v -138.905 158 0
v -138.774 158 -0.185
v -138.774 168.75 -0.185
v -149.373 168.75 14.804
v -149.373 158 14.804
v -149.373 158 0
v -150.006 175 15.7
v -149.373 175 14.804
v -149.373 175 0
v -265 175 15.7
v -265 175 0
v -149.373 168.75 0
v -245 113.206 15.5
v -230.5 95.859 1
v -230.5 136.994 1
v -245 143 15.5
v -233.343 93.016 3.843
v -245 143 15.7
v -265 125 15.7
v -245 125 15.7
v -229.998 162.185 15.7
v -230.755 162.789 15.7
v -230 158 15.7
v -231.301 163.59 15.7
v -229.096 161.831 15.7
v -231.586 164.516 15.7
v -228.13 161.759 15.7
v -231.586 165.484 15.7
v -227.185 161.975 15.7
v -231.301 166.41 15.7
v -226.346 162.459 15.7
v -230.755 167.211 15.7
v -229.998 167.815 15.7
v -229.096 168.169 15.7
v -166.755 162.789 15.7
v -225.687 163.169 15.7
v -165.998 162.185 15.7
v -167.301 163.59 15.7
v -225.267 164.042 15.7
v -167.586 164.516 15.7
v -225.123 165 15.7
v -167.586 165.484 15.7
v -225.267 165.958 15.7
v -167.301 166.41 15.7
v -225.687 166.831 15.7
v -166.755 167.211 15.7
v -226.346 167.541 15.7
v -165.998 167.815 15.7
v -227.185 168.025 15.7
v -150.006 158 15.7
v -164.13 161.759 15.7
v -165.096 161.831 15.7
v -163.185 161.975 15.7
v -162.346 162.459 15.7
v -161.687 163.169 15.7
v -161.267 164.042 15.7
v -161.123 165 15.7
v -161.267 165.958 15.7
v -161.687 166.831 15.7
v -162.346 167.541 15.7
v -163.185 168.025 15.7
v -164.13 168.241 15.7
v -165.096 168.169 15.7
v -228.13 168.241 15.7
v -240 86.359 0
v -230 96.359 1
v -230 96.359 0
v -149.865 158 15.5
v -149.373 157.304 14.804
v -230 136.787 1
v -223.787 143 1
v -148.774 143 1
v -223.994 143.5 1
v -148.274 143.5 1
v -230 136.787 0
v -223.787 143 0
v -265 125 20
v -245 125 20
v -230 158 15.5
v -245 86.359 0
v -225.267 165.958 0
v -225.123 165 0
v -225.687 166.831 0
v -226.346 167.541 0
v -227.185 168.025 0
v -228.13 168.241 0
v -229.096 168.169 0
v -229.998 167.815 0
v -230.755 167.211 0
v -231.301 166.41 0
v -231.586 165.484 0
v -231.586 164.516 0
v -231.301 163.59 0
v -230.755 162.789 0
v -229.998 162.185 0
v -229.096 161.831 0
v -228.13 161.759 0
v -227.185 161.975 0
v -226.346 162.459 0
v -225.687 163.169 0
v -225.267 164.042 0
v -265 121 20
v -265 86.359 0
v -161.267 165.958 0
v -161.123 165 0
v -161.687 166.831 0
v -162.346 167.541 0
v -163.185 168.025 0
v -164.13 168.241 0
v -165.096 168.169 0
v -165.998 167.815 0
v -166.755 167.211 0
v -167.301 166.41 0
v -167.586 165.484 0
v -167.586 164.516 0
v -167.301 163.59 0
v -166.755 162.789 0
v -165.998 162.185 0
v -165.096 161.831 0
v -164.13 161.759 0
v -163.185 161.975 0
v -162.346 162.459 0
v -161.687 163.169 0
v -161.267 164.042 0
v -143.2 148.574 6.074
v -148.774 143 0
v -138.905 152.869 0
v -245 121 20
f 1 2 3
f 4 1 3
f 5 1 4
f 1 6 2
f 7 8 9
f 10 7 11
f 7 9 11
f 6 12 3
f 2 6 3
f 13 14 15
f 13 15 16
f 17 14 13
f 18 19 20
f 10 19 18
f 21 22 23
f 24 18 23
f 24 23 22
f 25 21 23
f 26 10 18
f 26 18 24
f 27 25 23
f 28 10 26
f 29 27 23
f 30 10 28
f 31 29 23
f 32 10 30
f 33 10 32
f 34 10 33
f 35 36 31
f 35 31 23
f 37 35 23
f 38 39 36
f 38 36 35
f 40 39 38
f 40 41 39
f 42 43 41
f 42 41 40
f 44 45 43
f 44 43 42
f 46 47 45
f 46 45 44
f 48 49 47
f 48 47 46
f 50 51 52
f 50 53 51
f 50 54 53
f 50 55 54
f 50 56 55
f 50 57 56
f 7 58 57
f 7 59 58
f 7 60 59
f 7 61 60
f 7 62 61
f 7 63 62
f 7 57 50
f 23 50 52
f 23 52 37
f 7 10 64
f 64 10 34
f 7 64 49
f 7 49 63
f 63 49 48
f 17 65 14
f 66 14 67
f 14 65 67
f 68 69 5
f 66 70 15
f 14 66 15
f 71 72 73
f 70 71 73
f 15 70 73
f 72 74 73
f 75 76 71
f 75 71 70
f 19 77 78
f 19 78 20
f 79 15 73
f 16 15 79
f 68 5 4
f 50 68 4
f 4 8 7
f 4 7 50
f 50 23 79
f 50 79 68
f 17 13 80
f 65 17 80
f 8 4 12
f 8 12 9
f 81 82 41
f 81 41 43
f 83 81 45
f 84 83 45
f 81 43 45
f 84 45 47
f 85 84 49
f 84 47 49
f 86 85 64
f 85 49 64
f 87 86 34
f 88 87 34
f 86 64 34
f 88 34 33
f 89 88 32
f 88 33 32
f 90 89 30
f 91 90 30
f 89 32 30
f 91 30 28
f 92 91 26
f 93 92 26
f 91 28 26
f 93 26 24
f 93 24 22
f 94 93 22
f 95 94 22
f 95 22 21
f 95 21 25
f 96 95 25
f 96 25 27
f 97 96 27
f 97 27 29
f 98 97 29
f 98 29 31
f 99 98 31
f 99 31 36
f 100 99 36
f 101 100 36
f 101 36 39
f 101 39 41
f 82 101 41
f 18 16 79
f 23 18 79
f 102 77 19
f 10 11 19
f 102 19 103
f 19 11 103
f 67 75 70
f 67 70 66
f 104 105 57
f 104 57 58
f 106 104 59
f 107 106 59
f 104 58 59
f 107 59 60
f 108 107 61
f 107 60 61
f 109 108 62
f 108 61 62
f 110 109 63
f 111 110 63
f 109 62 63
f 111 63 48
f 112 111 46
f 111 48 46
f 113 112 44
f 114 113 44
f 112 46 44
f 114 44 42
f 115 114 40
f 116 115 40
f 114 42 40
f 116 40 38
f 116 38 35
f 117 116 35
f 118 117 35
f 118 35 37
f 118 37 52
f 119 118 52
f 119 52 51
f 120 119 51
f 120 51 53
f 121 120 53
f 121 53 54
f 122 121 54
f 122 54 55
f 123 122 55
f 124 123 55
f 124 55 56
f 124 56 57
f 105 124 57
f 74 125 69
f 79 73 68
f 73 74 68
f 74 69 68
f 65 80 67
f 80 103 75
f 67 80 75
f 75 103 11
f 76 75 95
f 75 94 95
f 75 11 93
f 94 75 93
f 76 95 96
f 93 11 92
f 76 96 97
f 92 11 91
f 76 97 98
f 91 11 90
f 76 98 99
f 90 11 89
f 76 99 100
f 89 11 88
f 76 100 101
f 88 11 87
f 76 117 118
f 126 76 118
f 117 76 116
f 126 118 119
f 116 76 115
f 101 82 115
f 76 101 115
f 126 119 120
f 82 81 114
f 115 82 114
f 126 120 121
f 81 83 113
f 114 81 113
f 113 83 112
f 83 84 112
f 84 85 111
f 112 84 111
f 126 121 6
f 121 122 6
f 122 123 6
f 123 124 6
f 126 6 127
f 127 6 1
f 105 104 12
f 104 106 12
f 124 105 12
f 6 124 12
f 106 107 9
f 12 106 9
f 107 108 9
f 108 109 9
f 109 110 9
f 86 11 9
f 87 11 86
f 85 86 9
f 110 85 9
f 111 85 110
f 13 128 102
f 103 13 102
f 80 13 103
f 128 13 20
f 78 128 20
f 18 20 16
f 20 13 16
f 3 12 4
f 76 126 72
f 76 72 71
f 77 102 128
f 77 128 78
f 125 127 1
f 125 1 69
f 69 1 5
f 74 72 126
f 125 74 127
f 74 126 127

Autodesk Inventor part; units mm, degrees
ref_plane "YZ Plane" through (0, 0, 0) normal (1, 0, 0) x (0, 1, 0)
ref_plane "XZ Plane" through (0, 0, 0) normal (0, 1, 0) x (-1, 0, 0)
ref_plane "РабПлоскость1" through (0, 0, 0) normal (0, 0, 1) x (1, 0, 0)
sketch "Эскиз1" plane through (0, 0, 0) normal (0, 0, 1) x (1, 0, 0)
  line L0 (265, 175) -> (-265, 175)
  line L1 (-265, 175) -> (-265, -175)
  line L2 (-265, 125) -> (-245, 125)
  line L3 (-245, 125) -> (-245, 143)
  line L4 (-245, 143) -> (-230, 158)
  line L5 (-230, 158) -> (-149.3726, 158)
  line L6 (-149.3726, 158) -> (-149.3726, 178)
  point P0 (0, 0)
  point P1 (-149.3726, 175)
extrude "Выдавливание1" add sketch "Эскиз1" along normal blind 15.7
sketch "Эскиз2" plane through (-245, 125, 0) normal (1, 0, 0) x (0, 0, -1)
  line L0 (0, 0) -> (-15.7, 0) projected
  line L1 (-20, -4) -> (0, -38.641) projected
  line L2 (-20, -4) -> (-20, 0) projected
  line L3 (0, 50) -> (0, -300) projected
  line L4 (-20, 0) -> (-15.7574, 0) projected
  line L5 (-20, 0) -> (0, 0)
  line L6 (0, -38.641) -> (0, 0)
  point P0 (0, -125)
  point P1 (-1, -36.909)
  point P2 (-1, 0)
  point P3 (-1, 0)
ref_plane "РабПлоскость2" through (-265, -125, -86) normal (1, 0, 0) x (0, 1, 0)
extrude "Выдавливание2" add sketch "Эскиз2" against normal up to surface (20 mm away)
sketch "Эскиз3" plane through (-230, 158, 0) normal (0, -1, 0) x (1, 0, 0)
  line L0 (91.2262, -0.185) -> (79.9532, 15.7574) projected
  line L1 (80.6274, 0) -> (80.6274, 15.7) projected
  line L2 (0, 0) -> (80.6274, 0) projected
  line L3 (80.6274, 0) -> (91.2262, -0.185)
  point P0 (230, 0)
  point P1 (80.6274, 14.8038)
extrude "Выдавливание3" add sketch "Эскиз3" against normal blind 10.75
sketch "Эскиз4" plane through (0, 0, 0) normal (0, 0, -1) x (-1, 0, 0)
  line L0 (245, 143) -> (230, 158) projected
  line L1 (230, 158) -> (149.3726, 158) projected
  line L2 (245, 86.359) -> (245, 143) projected
  line L3 (149.3726, 158) -> (138.7738, 158) projected
  line L4 (148.7738, 143) -> (149.3726, 143)
  line L5 (149.3726, 143) -> (223.7868, 143)
  line L6 (223.7868, 143) -> (230, 136.7868)
  line L7 (230, 136.7868) -> (230, 96.359)
  line L8 (138.7738, 153) -> (138.7738, 158)
  line L9 (240, 86.359) -> (245, 86.359)
  line L10 (240, 86.359) -> (230, 96.359)
  line L11 (148.7738, 143) -> (138.7738, 153)
  point P0 (0, 0)
  point P1 (138.7738, 143)
  point P2 (230, 86.359)
  point P3 (245, 88.091)
  dimension "d6" = 15
  dimension "d7" = 10
  dimension "d8" = 10
  dimension "d9" = 10
  dimension "d10" = 10
extrude "Выдавливание4" add sketch "Эскиз4" against normal blind 1
chamfer "Фаска1" distance 14.5 angle 45 3 edges at (-237.5, 150.5, 1) (-184.8059, 158, 1) (-245, 115.5455, 1)
sketch "Эскиз5" plane through (-245, 86.359, 15.5) normal (-1, 0, 0) x (0, 0, 1)
  point P0 (-15.5, -86.359)
sketch "Эскиз6" plane through (-245, 86.359, 15.5) normal (-1, 0, 0) x (0, 0, 1)
  line L0 (-15.5, 0) -> (0, 0) projected
  line L1 (0, 26.8468) -> (-15.5, 0) projected
  line L2 (0, 26.8468) -> (0, 0) projected
  point P0 (-15.5, -86.359)
extrude "Выдавливание5" cut sketch "Эскиз6" against normal blind 19.5
sketch "Эскиз7" plane through (-149.3726, 158, 15.5) normal (0, 1, 0) x (1, 0, 0)
  line L0 (10.5987, 15.5) -> (10.5987, 0) projected
  line L1 (10.4679, 15.5) -> (10.5987, 15.5) projected
  line L2 (10.4679, 15.5) -> (0, 0.6962) projected
  line L3 (0, 0.6962) -> (0, 0) projected
  line L4 (0, 0) -> (10.5987, 0) projected
  point P0 (149.3726, 15.5)
extrude "Выдавливание6" cut sketch "Эскиз7" against normal blind 19.5
sketch "Эскиз8" plane through (0, 0, 15.7) normal (0, 0, 1) x (1, 0, 0)
  circle A0 centre (-164.3726, 165) radius 3.25 projected
  circle A1 centre (-228.3726, 165) radius 3.25 projected
  point P0 (0, 0)
extrude "Выдавливание7" cut sketch "Эскиз8" against normal blind 28.75
sketch "Эскиз9" plane through (-230, 158, 15.7) normal (0, -1, 0) x (1, 0, 0)
  line L0 (86.8003, -9.6259) -> (80.6274, -0.8962) projected
  line L1 (81.7345, -2.4619) -> (79.5689, 0.6008)
  line L2 (79.5689, 0.6008) -> (81.1742, 0.6008)
  line L3 (81.1742, 0.6008) -> (81.1742, -1.6694)
  point P0 (230, -15.7)
  point P1 (80.6274, -0.8962)
  point P2 (81.1742, -1.6694)
extrude "Выдавливание8" cut sketch "Эскиз9" along normal through all both and the other way through all
equation "\"d8\" = d7"
equation "\"d9\" = d7"
equation "\"d10\" = d9"
properties part number "Накладка_левая"
